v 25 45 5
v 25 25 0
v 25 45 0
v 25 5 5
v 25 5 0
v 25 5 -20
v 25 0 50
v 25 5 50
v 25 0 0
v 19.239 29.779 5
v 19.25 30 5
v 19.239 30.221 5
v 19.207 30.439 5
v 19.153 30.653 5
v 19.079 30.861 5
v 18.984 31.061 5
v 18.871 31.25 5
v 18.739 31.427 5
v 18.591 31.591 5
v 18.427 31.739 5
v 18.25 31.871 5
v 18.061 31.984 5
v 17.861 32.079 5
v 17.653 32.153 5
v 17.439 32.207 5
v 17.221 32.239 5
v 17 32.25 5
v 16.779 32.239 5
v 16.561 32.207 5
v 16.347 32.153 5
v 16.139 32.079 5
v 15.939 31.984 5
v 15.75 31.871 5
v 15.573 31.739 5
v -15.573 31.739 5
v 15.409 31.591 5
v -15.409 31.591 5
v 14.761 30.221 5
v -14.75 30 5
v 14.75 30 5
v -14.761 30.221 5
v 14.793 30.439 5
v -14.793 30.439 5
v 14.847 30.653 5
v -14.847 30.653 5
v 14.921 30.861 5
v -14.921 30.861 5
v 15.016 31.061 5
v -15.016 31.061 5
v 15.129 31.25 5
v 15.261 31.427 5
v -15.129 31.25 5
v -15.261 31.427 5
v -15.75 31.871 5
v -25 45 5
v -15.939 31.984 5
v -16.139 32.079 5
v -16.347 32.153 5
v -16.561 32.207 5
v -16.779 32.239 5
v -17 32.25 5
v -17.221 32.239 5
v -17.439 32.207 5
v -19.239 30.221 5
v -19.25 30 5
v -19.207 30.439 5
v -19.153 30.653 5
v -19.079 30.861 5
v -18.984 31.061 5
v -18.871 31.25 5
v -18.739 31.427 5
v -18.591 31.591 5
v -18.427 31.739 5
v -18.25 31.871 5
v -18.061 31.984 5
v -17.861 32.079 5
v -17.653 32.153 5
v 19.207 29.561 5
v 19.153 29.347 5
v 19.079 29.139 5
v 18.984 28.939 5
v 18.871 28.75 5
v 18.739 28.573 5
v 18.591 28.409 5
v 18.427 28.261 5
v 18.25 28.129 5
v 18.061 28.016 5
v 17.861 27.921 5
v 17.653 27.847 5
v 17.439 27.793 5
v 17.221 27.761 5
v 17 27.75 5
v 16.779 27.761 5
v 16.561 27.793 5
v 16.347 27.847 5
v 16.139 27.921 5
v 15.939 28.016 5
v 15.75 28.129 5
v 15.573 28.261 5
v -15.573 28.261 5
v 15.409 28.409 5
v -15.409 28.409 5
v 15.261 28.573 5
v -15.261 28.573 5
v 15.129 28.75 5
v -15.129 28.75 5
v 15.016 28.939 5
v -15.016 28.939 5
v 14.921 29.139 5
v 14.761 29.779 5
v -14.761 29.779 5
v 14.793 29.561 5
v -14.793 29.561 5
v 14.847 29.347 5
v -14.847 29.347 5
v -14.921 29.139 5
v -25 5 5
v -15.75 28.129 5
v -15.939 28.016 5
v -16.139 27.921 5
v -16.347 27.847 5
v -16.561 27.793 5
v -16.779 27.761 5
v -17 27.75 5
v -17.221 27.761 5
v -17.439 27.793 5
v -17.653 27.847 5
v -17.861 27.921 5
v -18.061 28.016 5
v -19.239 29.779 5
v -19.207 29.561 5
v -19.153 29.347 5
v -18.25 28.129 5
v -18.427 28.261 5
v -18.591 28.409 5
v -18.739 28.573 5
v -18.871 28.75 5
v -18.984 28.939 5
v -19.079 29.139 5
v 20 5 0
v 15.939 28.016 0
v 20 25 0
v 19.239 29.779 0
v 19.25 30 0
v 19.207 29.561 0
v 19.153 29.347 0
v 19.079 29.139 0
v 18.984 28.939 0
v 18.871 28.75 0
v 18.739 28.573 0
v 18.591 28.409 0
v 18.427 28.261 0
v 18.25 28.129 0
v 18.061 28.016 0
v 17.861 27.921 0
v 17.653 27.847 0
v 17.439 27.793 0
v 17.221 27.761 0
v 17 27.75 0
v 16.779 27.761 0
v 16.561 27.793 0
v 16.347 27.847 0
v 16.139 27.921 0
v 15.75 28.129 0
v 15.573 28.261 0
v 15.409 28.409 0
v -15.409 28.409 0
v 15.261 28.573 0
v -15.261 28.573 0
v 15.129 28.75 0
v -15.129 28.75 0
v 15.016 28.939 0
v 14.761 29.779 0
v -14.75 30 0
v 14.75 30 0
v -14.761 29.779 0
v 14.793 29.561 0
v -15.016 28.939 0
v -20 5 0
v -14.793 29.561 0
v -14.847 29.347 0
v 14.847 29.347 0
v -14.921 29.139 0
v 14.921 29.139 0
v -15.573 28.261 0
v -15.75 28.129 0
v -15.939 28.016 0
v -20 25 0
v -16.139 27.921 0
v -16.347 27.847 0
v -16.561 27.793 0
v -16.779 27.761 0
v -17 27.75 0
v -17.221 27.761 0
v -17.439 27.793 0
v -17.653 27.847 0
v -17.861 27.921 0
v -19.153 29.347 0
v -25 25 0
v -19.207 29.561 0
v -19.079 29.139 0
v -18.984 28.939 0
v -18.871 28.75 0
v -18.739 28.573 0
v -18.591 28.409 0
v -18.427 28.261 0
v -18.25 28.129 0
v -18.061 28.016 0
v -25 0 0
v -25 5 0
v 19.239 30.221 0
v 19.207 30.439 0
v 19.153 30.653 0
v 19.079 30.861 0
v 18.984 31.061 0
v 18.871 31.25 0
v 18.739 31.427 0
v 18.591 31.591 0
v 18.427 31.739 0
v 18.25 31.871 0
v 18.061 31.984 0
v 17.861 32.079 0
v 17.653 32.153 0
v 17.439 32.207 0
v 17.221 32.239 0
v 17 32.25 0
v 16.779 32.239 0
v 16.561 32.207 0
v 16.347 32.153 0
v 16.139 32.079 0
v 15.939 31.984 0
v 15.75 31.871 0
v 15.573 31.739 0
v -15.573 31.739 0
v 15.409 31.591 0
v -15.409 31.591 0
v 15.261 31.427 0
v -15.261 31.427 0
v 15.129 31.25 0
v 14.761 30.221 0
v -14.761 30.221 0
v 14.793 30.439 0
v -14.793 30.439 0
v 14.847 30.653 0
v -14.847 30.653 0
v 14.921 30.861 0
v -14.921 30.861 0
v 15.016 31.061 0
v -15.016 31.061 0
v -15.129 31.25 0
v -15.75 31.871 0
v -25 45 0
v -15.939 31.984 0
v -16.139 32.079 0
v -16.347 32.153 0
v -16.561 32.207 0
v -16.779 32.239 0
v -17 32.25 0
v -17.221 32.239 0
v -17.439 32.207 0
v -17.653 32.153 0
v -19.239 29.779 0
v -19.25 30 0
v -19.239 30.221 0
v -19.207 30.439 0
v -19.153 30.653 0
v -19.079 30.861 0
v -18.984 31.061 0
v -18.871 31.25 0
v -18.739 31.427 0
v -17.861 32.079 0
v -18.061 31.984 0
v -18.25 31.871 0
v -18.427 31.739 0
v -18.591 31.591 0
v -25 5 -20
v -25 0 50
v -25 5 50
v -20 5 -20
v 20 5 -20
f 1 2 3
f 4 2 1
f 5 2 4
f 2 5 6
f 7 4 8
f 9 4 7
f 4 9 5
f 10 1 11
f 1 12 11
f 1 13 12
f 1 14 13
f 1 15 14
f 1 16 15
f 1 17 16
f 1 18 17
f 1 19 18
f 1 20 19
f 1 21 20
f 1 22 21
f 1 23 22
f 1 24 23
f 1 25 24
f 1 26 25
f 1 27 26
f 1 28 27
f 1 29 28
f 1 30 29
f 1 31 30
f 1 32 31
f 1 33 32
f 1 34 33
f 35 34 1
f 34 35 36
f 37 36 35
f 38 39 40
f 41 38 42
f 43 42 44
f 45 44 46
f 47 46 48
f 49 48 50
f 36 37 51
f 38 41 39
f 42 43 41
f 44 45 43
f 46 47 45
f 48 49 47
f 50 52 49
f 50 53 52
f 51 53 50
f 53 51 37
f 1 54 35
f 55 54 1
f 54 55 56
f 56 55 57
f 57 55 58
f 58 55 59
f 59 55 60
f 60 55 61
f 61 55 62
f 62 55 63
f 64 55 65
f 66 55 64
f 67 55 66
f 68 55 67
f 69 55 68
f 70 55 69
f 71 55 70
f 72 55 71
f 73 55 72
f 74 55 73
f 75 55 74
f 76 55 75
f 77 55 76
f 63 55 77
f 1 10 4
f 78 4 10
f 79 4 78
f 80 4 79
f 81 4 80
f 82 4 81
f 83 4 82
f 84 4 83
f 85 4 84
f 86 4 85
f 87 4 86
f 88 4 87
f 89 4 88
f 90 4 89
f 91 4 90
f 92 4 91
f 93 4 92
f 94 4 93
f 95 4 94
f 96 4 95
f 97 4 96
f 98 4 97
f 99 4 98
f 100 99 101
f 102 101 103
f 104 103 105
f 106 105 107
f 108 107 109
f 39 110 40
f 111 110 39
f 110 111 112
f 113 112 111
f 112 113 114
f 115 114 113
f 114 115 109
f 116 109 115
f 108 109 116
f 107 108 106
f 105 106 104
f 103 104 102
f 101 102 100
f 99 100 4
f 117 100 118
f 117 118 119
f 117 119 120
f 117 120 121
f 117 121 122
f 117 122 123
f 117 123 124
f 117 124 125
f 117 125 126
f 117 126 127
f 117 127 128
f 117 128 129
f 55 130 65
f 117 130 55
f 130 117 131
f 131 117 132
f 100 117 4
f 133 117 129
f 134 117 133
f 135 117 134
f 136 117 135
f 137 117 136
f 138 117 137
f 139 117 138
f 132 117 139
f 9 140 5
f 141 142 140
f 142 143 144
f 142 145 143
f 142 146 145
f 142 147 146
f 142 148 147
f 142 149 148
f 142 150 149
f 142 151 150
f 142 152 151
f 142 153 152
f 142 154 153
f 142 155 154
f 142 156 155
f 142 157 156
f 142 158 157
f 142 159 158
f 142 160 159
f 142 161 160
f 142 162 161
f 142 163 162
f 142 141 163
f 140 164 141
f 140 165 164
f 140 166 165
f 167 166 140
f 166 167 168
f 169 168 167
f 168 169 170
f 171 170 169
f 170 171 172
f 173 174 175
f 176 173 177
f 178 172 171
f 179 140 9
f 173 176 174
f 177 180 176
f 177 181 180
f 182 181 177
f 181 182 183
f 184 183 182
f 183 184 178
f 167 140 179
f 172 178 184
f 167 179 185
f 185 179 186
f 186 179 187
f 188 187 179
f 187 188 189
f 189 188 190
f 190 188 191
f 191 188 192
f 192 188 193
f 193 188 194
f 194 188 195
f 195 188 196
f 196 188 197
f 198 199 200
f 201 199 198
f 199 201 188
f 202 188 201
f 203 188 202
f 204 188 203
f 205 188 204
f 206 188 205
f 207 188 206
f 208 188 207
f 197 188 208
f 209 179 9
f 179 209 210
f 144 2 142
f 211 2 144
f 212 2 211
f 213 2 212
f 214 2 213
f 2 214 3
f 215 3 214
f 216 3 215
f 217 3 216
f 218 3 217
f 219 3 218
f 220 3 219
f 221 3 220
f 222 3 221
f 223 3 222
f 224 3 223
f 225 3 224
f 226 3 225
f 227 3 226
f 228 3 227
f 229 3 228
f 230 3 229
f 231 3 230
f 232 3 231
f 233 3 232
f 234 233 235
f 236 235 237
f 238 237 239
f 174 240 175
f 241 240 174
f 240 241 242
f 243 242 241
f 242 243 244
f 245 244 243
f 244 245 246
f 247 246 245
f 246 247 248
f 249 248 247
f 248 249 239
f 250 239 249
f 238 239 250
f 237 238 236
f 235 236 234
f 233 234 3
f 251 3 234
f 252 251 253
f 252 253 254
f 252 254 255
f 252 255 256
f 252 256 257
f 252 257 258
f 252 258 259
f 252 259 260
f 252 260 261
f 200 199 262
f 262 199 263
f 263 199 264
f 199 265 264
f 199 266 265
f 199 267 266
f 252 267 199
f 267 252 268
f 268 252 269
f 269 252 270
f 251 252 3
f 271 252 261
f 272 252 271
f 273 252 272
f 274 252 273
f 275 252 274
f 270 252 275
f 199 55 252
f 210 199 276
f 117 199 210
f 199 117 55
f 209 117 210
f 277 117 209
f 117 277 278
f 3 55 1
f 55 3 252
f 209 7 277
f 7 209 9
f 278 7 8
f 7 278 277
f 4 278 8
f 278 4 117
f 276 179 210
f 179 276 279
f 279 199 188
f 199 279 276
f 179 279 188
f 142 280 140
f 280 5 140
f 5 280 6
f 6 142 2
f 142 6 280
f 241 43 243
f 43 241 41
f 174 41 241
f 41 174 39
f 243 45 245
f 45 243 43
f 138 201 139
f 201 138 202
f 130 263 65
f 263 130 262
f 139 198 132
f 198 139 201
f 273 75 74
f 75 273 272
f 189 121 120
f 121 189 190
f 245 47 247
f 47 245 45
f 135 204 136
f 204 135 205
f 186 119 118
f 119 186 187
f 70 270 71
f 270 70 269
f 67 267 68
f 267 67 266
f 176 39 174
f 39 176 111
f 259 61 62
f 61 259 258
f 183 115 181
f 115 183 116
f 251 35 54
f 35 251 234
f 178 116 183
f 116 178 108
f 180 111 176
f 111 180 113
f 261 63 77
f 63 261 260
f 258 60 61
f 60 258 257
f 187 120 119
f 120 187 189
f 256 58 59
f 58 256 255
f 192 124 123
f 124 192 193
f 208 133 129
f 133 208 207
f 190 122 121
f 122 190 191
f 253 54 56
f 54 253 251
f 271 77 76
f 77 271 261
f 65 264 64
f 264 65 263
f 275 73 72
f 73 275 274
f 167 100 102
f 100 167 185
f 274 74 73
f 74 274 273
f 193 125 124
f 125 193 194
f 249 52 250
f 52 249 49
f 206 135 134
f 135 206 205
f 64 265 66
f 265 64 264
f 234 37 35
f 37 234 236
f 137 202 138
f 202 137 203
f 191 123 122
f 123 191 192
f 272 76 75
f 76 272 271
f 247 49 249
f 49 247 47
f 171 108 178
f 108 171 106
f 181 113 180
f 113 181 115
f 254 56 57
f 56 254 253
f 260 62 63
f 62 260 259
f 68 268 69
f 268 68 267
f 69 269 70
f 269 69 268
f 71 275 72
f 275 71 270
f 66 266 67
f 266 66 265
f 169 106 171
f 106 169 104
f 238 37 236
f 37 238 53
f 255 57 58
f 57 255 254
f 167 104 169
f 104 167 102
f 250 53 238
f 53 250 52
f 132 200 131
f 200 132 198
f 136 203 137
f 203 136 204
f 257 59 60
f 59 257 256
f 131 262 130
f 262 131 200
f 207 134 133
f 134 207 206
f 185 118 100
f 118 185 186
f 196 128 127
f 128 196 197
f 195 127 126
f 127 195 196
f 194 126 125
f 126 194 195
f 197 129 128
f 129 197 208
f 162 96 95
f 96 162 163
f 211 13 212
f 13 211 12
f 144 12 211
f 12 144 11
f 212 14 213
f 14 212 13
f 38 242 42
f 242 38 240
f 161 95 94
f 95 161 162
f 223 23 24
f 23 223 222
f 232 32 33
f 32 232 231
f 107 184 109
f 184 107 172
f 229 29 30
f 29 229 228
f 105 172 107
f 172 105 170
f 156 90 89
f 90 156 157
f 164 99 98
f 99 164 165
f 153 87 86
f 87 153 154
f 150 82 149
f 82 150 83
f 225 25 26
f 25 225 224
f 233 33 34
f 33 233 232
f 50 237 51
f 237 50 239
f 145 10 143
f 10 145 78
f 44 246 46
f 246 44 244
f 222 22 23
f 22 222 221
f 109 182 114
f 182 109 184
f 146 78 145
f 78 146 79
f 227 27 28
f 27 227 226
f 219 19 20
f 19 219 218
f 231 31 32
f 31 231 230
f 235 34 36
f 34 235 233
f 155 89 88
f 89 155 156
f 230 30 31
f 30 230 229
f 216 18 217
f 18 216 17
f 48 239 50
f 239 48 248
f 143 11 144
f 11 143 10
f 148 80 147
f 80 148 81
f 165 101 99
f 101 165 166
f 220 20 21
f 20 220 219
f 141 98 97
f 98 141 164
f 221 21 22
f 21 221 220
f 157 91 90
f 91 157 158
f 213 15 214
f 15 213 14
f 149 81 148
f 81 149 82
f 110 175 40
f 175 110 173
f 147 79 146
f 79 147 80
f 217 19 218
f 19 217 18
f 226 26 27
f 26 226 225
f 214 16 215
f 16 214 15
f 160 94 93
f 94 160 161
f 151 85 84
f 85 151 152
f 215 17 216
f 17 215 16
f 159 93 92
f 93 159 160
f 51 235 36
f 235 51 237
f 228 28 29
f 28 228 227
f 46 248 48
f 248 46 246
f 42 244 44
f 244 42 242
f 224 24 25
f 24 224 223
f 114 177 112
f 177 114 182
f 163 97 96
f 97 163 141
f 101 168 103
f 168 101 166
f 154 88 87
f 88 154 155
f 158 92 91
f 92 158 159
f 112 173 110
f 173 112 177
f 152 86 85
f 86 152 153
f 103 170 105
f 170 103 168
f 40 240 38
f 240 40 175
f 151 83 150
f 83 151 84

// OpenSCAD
// Parameters (mm)
base_x = 50;               // width of base plate (from -25 to 25)
base_y = 45;               // length of base plate (from 0 to 45)
base_z = 5;                // thickness of base plate

motor_x = 50;              // width of motor plate (same as base)
motor_y = 5;               // thickness of motor plate (from 0 to 5)
motor_z = 50;              // height of motor plate (from 0 to 50)

m4_d = 4.5;                // M4 hole diameter
m4_r = m4_d/2;            // M4 hole radius

m3_d = 3.4;                // M3 hole diameter
m3_r = m3_d/2;            // M3 hole radius

boss_d = 23;               // motor centring boss hole diameter
boss_r = boss_d/2;         // boss hole radius
boss_z = 28;               // Z‑center of boss hole

gusset_thick = 5;          // thickness of each gusset (in X)
gusset_leg = 20;           // leg length of triangular gusset (in Y and Z)

$fn = 64;                  // resolution for circles and cylinders

// ---------- Solid parts ----------
module solid_parts() {
    union() {
        // Base plate
        translate([-25, 0, 0])
            cube([base_x, base_y, base_z], center = false);
        
        // Motor plate
        translate([-25, 0, 0])
            cube([motor_x, motor_y, motor_z], center = false);
        
        // Left gusset
        translate([-25, 0, 5])               // shift to X = -25, Z = 5
            rotate([0, 90, 0])                // extrude thickness into X
                linear_extrude(height = gusset_thick)
                    polygon(points = [[5,5], [25,5], [5,25]]);
        
        // Right gusset
        translate([20, 0, 5])                // shift to X = 20, Z = 5
            rotate([0, 90, 0])
                linear_extrude(height = gusset_thick)
                    polygon(points = [[5,5], [25,5], [5,25]]);
    }
}

// ---------- Cutting features ----------
module cut_features() {
    union() {
        // M4 through‑holes in base plate
        for (pos = [[-17,30], [17,30]]) {
            translate([pos[0], pos[1], -0.5])   // extend 0.5 mm below & above
                cylinder(r = m4_r, h = base_z + 1);
        }
        
        // Boss hole (oriented along Y) in motor plate
        translate([0, -0.5, boss_z])            // extend 0.5 mm beyond Y faces
            rotate([90,0,0])
                cylinder(r = boss_r, h = motor_y + 2);
        
        // Four M3 screw holes (oriented along Y) in motor plate
        for (dx = [-15.5, 15.5])
            for (dz = [-15.5, 15.5])
                translate([dx, -0.5, boss_z + dz])
                    rotate([90,0,0])
                        cylinder(r = m3_r, h = motor_y + 2);
    }
}

// ---------- Final model ----------
difference() {
    solid_parts();
    cut_features();
}
